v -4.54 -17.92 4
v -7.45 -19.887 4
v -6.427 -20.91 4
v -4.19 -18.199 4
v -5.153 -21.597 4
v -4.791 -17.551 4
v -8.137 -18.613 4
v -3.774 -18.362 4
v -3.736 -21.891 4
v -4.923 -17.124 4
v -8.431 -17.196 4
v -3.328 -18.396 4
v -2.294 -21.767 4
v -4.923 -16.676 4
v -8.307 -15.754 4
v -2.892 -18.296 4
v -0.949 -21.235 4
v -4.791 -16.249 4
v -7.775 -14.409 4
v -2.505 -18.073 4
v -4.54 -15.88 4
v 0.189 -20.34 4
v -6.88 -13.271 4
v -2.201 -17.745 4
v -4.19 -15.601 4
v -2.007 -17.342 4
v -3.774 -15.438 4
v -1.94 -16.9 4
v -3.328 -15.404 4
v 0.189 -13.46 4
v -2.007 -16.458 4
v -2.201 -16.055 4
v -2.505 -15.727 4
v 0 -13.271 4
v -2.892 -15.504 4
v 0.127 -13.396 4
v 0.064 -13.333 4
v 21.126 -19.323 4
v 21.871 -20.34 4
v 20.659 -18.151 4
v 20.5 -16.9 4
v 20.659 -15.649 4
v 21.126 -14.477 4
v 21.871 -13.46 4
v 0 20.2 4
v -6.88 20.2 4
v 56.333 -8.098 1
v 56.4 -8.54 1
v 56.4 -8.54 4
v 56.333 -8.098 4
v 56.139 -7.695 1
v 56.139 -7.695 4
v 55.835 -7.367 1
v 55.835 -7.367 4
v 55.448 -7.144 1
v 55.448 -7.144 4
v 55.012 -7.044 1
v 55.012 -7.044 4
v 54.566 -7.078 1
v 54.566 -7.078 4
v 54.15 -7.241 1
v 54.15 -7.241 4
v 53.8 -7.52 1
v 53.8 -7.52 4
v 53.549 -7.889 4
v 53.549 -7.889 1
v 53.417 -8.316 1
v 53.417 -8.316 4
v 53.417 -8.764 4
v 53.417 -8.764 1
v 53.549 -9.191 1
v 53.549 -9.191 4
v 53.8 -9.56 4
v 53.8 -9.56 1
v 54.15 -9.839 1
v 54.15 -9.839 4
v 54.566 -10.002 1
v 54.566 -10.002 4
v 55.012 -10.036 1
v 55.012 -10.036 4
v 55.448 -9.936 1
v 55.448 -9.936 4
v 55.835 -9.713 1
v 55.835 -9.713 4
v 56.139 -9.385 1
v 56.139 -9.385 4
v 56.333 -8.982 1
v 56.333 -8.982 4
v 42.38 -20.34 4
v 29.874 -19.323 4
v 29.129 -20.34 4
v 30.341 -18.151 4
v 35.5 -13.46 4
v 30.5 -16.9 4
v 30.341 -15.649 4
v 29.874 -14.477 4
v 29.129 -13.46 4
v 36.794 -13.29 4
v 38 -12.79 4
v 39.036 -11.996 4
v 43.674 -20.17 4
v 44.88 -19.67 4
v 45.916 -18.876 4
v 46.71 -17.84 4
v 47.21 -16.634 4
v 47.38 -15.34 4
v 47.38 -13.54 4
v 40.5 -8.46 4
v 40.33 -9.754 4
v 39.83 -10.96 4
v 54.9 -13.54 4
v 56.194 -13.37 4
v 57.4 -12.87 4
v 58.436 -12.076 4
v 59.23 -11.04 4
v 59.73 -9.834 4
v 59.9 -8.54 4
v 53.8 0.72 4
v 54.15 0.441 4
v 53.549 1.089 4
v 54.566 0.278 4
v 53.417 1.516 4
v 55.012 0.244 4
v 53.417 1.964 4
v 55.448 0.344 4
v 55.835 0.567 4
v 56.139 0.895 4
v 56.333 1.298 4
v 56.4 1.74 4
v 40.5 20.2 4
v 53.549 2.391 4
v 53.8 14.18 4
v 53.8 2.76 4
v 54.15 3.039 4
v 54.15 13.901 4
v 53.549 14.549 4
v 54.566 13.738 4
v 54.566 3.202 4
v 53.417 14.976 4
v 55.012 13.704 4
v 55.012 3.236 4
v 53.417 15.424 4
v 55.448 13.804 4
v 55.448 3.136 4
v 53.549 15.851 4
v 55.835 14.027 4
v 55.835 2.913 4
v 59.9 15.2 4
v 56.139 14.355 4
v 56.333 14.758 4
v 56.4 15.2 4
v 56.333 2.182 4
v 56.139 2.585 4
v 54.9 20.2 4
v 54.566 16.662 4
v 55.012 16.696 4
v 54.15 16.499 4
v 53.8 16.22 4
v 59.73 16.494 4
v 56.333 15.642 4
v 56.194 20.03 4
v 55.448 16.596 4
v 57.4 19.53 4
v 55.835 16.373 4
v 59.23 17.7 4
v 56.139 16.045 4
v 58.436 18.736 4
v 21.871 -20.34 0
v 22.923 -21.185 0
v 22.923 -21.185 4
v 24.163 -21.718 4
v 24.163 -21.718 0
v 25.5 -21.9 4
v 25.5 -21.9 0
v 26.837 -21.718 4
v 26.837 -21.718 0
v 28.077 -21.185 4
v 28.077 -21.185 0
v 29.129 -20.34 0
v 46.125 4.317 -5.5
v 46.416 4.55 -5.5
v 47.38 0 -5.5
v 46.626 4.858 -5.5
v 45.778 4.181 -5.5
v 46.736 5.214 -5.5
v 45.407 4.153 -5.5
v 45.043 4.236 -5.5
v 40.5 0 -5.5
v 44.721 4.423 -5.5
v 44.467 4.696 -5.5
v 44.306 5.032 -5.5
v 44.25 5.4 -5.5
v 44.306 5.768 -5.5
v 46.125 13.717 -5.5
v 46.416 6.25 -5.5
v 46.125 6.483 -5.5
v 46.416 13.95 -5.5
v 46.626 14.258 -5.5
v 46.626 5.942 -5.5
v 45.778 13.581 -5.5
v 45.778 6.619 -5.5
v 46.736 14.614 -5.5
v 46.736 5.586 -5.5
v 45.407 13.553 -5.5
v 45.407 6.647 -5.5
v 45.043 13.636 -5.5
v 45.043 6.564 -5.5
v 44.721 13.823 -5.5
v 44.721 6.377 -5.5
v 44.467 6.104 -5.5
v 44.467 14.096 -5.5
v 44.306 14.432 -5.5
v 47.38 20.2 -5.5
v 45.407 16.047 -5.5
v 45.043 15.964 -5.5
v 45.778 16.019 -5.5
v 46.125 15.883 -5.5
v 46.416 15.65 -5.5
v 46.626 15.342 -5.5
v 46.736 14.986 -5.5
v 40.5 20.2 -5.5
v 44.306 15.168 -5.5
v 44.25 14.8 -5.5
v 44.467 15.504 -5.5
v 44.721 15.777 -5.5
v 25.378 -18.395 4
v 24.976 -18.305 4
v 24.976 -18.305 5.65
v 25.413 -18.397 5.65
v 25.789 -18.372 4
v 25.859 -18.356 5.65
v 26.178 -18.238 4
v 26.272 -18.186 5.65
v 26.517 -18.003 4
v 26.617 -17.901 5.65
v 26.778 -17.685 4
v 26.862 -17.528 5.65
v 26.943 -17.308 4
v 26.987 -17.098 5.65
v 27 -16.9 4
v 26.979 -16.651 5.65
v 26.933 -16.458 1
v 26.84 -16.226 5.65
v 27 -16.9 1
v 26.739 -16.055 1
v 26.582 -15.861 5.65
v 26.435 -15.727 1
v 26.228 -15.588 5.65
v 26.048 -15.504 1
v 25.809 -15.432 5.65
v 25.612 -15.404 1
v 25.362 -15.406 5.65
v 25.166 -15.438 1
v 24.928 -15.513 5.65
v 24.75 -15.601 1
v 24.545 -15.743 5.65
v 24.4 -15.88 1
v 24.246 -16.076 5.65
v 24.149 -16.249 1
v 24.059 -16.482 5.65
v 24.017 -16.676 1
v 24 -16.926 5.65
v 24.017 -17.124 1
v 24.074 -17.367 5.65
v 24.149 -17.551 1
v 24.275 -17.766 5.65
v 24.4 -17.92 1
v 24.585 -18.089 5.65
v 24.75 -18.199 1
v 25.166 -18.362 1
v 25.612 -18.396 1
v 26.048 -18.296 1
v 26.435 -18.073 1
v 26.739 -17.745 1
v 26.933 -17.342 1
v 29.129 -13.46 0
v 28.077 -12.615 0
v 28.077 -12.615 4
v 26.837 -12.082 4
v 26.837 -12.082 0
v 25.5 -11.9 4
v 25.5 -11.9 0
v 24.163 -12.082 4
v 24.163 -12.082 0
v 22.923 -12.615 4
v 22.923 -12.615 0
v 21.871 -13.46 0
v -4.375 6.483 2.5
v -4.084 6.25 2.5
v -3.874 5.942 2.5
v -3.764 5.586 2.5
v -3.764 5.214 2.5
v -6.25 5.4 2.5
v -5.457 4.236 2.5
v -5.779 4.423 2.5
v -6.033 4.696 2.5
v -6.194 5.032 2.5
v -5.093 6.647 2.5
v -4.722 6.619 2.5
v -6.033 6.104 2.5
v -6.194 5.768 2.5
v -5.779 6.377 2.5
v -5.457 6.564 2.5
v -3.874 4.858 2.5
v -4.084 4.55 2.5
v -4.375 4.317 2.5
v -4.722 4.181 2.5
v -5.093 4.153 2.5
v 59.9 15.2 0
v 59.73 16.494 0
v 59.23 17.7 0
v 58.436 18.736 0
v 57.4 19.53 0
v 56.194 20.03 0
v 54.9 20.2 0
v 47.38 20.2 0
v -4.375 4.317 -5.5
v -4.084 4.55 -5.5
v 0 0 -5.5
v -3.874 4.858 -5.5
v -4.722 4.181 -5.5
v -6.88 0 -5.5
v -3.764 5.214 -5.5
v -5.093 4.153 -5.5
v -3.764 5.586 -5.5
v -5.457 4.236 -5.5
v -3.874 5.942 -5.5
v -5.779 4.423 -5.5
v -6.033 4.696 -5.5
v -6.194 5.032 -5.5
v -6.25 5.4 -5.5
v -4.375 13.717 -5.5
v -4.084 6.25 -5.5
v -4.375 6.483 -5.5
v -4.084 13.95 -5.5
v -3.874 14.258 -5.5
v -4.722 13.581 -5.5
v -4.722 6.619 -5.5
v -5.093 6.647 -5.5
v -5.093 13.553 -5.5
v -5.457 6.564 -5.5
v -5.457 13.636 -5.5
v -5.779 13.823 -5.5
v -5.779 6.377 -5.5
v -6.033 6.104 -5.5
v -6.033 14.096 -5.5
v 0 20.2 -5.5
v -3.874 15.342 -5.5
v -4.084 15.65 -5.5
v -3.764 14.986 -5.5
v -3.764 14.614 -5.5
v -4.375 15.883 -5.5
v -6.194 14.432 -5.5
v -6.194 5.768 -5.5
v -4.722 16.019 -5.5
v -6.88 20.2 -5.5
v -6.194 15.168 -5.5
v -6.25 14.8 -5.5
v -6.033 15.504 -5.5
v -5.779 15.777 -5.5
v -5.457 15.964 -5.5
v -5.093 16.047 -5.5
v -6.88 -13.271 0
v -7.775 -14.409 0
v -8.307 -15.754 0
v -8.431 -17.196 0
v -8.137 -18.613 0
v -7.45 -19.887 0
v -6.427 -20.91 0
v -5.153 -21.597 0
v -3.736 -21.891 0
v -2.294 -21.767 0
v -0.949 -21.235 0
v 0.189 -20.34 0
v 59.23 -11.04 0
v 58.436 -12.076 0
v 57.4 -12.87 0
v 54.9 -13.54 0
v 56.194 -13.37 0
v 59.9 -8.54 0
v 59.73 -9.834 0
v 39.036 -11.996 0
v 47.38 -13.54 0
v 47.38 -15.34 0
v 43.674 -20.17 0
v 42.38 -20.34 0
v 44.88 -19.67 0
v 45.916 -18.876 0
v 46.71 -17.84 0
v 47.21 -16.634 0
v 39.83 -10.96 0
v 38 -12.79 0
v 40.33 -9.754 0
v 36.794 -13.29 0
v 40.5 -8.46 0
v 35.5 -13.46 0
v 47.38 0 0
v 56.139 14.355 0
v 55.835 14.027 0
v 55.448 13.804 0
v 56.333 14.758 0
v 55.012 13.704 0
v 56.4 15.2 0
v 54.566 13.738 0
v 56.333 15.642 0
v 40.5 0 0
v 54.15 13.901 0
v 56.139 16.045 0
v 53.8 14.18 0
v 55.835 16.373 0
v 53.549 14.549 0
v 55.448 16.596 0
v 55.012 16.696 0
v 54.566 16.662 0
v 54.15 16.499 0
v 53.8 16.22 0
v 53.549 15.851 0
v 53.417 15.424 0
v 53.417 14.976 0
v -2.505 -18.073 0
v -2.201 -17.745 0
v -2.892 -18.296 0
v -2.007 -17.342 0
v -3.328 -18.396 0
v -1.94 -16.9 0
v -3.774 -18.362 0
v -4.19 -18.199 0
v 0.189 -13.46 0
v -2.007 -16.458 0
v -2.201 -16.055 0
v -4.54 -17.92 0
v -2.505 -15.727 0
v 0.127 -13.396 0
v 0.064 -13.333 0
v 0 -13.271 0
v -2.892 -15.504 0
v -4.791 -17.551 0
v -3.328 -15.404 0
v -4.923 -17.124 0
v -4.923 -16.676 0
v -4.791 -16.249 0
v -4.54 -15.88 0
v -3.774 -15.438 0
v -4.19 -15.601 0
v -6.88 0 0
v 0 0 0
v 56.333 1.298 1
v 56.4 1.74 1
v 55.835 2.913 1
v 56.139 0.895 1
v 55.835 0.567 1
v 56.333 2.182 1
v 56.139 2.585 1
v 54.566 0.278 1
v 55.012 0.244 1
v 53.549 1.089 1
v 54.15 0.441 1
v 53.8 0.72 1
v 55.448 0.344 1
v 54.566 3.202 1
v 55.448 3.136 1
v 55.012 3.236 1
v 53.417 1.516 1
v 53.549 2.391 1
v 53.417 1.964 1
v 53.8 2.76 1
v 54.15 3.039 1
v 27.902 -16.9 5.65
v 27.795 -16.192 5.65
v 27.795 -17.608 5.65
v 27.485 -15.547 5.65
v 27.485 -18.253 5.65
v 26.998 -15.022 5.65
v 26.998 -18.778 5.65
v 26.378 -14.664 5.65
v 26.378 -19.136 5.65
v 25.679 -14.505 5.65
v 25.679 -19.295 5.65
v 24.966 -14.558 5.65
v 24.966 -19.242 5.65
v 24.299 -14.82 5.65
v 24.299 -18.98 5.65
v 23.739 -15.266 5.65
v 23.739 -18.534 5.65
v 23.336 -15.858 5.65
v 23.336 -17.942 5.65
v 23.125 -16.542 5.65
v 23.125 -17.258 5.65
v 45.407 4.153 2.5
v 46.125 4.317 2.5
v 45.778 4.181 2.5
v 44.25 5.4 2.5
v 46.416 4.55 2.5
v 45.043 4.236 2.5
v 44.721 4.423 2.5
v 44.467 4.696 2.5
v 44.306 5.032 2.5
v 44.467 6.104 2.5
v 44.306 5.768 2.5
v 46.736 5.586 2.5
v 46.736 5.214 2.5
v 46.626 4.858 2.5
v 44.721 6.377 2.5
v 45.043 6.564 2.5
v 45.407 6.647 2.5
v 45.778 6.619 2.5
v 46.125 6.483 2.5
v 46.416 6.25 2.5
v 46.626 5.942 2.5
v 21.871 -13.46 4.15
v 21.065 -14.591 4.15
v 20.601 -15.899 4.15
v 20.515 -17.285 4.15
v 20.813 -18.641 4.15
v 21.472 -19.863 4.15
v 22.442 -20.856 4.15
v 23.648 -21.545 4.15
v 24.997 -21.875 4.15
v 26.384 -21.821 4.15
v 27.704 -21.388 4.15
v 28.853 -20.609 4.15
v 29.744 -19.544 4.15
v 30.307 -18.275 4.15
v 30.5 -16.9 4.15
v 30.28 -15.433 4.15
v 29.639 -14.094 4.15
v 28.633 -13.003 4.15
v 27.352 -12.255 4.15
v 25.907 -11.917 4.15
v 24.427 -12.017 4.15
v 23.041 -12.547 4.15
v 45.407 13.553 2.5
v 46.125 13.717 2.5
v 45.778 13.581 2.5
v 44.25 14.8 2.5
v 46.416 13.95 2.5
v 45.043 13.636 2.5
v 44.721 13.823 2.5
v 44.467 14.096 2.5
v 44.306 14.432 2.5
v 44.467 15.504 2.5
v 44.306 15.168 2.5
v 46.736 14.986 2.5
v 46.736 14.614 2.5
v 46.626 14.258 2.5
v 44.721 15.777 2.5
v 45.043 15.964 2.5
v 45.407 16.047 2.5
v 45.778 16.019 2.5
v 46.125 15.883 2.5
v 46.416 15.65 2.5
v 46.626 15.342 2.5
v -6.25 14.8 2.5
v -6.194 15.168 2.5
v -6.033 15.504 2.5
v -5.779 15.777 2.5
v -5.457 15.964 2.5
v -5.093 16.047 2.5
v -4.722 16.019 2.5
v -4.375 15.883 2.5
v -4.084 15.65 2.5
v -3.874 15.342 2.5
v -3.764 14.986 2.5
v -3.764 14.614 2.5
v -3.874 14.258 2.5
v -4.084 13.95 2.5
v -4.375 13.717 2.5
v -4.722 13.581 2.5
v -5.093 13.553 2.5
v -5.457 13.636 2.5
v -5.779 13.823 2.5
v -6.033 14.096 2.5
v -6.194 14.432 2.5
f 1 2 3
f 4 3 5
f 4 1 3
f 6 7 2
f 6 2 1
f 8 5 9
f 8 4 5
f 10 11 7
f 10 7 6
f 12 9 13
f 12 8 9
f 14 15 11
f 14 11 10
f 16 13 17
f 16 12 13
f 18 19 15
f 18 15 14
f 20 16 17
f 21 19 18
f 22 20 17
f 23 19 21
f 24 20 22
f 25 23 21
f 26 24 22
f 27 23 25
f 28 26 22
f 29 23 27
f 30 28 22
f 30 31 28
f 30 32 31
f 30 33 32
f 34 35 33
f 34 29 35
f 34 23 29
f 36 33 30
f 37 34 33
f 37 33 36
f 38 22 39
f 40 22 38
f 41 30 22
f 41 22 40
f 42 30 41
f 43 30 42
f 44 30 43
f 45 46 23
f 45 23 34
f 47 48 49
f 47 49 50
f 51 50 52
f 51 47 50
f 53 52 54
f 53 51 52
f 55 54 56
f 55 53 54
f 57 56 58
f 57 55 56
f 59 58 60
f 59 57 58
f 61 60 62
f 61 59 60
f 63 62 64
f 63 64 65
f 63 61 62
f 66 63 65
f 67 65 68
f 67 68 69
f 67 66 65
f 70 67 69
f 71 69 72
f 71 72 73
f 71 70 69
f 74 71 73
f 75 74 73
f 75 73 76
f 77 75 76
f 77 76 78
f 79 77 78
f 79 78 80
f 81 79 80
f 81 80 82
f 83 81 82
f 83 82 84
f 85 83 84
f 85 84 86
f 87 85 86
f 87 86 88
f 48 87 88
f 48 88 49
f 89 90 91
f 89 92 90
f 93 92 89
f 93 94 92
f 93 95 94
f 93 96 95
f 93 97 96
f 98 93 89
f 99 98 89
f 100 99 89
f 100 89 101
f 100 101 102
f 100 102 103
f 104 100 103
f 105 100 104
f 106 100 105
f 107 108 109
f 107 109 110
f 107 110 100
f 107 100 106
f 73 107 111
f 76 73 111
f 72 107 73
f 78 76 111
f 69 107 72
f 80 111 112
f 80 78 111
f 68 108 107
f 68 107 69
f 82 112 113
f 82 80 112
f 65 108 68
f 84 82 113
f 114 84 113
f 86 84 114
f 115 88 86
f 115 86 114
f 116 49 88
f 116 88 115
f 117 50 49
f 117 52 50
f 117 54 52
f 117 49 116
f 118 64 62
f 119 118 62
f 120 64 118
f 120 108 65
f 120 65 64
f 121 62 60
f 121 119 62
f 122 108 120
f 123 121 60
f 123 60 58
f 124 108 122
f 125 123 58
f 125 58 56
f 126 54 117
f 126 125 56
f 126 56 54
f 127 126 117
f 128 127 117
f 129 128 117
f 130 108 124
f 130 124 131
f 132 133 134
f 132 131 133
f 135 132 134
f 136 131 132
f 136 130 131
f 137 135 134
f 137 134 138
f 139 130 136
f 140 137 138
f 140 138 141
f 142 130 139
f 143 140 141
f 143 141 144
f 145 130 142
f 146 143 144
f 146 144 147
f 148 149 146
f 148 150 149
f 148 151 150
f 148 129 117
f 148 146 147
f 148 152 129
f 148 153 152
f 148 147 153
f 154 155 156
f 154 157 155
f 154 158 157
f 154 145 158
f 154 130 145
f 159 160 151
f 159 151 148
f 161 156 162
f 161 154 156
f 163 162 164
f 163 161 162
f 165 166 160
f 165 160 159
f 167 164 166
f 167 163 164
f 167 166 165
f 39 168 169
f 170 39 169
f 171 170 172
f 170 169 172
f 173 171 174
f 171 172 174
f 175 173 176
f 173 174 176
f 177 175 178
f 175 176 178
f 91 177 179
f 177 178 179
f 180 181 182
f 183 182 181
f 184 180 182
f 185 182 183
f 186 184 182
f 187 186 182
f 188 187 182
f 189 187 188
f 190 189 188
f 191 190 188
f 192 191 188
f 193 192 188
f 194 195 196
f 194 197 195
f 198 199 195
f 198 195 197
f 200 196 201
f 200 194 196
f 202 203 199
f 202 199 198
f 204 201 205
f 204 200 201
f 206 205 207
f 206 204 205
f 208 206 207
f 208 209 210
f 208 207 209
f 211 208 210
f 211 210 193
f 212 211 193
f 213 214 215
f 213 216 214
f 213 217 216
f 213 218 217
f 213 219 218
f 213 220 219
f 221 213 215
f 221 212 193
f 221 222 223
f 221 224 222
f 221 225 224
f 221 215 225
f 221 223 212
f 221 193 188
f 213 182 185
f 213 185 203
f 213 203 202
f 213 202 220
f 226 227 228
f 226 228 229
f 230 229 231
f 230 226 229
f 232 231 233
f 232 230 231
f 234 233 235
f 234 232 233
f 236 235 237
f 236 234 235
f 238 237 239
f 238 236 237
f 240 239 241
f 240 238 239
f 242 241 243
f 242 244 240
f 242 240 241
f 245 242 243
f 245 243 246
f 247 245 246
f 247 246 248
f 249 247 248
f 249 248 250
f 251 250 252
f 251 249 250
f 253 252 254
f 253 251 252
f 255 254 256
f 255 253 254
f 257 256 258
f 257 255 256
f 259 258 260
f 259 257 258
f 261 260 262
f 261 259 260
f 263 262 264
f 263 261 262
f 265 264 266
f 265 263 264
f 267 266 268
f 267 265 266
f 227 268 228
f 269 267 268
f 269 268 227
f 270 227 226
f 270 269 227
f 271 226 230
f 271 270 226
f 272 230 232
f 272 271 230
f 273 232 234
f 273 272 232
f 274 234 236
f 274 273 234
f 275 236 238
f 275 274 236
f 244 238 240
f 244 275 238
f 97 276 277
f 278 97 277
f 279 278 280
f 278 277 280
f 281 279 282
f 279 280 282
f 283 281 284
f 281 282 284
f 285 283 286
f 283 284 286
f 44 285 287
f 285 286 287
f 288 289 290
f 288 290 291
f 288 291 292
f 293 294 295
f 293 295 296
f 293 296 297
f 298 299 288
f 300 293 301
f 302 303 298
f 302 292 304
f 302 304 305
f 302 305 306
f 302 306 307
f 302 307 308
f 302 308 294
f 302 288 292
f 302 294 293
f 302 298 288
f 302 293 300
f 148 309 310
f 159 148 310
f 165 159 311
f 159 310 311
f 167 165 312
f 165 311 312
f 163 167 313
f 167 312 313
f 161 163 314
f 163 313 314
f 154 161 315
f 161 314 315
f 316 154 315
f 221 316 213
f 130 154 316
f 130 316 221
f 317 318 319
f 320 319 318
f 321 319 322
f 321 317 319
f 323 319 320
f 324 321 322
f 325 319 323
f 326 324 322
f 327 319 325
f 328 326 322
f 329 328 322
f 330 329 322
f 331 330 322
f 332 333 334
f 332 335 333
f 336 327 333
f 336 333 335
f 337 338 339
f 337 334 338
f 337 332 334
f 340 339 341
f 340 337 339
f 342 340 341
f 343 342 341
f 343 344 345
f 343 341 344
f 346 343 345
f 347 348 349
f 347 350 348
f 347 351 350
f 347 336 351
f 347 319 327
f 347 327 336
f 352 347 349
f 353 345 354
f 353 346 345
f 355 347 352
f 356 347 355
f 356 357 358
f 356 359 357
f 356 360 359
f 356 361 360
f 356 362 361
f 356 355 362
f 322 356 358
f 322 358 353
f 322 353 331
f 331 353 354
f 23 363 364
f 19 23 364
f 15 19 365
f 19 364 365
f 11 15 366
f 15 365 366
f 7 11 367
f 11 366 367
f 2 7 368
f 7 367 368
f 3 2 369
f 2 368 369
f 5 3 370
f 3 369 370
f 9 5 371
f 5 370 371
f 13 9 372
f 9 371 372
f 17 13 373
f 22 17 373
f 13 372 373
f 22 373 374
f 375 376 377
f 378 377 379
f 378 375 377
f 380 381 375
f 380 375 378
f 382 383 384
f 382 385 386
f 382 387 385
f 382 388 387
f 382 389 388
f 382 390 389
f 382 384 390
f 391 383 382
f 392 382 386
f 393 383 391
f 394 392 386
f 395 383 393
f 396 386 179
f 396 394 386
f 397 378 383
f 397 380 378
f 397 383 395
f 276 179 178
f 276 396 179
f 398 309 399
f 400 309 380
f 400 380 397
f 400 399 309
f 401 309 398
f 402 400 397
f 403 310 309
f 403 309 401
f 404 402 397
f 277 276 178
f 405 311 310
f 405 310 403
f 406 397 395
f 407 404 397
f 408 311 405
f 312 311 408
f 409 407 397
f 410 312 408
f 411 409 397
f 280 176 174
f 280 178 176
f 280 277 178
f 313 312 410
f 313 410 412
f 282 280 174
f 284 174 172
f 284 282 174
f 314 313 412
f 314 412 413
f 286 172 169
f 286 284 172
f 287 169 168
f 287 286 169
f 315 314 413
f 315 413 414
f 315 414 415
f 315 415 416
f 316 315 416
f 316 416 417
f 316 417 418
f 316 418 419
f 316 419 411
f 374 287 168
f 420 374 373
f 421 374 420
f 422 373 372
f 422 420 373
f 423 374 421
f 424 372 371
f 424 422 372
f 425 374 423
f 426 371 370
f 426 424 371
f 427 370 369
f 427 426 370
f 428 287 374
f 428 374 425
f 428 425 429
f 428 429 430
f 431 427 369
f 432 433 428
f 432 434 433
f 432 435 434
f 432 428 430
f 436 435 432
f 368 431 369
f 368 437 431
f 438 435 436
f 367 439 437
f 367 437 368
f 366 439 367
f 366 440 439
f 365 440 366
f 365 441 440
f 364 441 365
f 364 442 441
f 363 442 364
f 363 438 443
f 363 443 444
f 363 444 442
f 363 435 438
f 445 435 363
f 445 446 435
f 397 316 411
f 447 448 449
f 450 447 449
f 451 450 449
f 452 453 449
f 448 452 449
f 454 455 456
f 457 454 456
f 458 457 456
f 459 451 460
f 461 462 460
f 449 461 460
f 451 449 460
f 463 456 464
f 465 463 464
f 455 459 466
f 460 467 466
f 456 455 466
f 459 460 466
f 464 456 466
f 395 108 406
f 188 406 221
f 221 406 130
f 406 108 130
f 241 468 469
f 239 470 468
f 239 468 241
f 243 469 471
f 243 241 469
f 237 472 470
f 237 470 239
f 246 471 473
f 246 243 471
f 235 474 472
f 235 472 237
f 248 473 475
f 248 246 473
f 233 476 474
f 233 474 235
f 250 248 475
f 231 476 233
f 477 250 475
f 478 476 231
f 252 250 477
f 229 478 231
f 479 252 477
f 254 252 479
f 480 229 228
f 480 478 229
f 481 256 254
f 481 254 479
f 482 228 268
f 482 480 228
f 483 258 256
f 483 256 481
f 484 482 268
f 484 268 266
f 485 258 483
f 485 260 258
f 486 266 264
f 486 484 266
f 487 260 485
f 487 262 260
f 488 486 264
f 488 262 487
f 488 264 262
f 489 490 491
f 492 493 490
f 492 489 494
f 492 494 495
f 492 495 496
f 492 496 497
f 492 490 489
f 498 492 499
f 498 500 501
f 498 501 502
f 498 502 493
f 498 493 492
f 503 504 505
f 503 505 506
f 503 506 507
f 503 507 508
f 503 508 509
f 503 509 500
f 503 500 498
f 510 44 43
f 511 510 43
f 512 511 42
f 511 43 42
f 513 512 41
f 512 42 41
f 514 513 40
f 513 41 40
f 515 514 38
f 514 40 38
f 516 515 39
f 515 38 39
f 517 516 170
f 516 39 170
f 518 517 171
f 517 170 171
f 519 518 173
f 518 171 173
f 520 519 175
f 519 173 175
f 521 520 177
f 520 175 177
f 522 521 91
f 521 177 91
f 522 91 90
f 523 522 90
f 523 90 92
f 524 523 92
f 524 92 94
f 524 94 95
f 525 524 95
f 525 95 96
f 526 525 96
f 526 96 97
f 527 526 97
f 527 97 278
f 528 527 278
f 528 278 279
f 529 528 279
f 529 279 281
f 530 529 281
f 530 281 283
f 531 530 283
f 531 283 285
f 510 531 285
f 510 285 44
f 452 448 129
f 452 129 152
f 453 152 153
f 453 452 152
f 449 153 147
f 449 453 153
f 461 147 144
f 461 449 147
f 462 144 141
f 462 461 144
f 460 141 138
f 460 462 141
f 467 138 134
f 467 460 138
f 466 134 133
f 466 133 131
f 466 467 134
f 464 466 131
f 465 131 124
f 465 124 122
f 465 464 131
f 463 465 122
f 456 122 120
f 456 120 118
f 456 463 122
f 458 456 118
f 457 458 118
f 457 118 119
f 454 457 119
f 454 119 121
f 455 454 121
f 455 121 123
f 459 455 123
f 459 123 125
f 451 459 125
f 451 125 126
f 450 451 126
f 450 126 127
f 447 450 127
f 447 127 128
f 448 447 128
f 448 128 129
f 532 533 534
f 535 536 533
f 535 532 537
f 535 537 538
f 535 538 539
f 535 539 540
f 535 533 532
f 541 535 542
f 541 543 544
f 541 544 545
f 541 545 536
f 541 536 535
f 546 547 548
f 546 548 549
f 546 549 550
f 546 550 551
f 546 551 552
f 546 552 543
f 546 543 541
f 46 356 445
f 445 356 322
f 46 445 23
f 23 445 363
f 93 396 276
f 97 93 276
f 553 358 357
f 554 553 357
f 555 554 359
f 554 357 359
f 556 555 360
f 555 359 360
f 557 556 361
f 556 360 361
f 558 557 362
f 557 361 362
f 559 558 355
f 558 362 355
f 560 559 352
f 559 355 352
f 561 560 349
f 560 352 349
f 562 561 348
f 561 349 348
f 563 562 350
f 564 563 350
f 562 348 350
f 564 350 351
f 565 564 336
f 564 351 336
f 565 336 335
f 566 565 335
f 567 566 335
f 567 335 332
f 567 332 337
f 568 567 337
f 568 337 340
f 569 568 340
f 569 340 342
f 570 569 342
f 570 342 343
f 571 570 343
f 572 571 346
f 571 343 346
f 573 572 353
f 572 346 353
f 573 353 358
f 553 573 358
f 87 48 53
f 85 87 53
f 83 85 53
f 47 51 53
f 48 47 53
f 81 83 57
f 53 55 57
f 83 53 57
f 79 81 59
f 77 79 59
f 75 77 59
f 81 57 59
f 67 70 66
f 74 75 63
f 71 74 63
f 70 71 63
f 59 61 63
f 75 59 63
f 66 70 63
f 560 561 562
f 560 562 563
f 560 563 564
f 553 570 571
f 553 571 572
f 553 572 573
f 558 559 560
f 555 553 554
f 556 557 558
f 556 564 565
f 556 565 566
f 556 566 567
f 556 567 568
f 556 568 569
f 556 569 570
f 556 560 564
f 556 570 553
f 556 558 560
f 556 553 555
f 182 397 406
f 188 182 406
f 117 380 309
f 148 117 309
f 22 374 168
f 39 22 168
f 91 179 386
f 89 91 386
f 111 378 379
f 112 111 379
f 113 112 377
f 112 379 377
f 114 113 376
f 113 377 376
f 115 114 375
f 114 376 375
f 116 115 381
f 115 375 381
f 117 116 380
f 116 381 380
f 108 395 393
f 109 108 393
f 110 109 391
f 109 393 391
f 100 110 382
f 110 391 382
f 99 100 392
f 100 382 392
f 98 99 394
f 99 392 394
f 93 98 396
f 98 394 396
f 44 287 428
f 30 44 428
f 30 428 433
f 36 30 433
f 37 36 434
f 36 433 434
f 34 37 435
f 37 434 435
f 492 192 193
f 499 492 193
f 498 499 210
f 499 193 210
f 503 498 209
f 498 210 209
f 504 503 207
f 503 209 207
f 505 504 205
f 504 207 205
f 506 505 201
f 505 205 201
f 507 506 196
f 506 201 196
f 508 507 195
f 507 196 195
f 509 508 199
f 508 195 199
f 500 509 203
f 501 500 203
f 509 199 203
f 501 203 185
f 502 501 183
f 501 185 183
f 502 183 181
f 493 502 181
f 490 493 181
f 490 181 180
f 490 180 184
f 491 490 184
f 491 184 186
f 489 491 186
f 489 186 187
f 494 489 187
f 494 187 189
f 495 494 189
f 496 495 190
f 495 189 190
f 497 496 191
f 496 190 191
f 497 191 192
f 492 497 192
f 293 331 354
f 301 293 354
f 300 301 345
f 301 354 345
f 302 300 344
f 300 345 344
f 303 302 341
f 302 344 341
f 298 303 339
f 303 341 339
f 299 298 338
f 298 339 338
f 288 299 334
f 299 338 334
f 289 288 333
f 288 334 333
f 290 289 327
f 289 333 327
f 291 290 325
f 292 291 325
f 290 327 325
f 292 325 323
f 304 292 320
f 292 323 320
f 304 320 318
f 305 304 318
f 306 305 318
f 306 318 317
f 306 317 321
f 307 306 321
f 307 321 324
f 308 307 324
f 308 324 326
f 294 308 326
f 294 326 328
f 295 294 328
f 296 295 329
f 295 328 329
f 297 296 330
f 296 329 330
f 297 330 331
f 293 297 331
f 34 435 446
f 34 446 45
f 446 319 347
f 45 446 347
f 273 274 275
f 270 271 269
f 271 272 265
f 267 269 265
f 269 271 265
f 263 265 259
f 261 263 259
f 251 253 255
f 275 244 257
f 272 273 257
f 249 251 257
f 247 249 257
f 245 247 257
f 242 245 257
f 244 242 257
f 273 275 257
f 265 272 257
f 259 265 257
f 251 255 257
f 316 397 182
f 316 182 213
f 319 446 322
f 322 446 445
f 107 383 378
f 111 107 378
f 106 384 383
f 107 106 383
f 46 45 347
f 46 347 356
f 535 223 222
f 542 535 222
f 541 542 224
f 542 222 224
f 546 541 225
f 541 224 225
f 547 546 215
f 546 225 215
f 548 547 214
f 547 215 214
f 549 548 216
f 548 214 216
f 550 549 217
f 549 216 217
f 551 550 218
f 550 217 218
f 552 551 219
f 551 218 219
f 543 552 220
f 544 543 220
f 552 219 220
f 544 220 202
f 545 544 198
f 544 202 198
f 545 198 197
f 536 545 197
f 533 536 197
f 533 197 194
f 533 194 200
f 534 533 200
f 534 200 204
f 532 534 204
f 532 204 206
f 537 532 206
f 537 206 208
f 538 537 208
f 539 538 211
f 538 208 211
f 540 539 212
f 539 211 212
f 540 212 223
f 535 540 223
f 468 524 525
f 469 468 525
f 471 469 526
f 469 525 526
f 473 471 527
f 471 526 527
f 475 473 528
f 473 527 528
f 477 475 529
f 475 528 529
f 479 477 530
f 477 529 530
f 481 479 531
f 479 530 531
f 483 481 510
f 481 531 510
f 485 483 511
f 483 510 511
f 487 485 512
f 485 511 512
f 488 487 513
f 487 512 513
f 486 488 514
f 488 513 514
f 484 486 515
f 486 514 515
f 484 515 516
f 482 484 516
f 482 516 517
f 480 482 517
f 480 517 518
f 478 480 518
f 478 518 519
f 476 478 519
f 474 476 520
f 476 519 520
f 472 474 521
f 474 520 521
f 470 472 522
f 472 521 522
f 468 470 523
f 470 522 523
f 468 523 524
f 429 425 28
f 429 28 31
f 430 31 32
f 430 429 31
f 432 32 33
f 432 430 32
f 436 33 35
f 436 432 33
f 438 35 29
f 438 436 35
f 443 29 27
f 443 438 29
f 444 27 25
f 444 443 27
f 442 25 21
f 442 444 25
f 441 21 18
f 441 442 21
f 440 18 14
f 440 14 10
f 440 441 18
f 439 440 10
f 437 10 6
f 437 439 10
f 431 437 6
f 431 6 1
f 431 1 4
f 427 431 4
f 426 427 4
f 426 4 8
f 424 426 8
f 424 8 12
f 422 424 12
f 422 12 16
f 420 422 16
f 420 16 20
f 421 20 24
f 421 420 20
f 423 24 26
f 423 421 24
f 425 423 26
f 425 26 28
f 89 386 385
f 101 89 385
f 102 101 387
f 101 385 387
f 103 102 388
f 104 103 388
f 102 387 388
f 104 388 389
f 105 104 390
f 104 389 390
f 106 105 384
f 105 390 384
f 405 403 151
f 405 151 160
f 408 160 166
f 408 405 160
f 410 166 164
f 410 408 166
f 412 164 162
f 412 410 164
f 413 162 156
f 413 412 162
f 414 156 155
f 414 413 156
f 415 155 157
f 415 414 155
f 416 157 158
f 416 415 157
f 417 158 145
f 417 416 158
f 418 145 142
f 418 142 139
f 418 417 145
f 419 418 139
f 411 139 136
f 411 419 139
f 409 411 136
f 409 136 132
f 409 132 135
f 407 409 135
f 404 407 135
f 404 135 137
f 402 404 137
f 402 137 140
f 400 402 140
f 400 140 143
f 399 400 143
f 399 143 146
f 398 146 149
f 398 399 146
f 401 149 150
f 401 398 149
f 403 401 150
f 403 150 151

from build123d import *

# Parameters (mm, degrees)
CROQUIS1_R              = 1.5
SALIENTE_EXTRUIR1_DEPTH = 4
CROQUIS2_W              = 6.88
CROQUIS2_H              = 20.2
SALIENTE_EXTRUIR2_DEPTH = 5.5
CROQUIS3_R              = 5
CROQUIS3_R_2            = 1.5
SALIENTE_EXTRUIR3_DEPTH = 1.65
CROQUIS4_R              = 1.5
SALIENTE_EXTRUIR4_DEPTH = 1
CROQUIS5_R              = 1.25
CORTAR_EXTRUIR1_DEPTH   = 8


with BuildPart() as part:
    # Croquis1 → Saliente-Extruir1 (new body)
    with BuildSketch(Plane.XY):
        with BuildLine():
            Line((59.9, -8.54), (59.9, 15.2))
            ThreePointArc((59.9, 15.2), (58.435533906, 18.735533906), (54.9, 20.2))
            Line((54.9, 20.2), (40.5, 20.2))
            Line((40.5, 20.2), (40.5, -8.46))
            ThreePointArc((40.5, -8.46), (39.035533906, -11.995533906), (35.5, -13.46))
            Line((35.5, -13.46), (29.128553431, -13.46))
            ThreePointArc((29.128553431, -13.46), (25.5, -11.9), (21.871446569, -13.46))
            Line((21.871446569, -13.46), (0.188553431, -13.46))
            ThreePointArc((0.188553431, -13.46), (0.095533906, -13.364466094), (0, -13.271446569))
            Line((0, -13.271446569), (0, 20.2))
            Line((0, 20.2), (-6.88, 20.2))
            Line((-6.88, 20.2), (-6.88, -13.271446569))
            ThreePointArc((-6.88, -13.271446569), (-6.975533906, -20.435533906), (0.188553431, -20.34))
            Line((0.188553431, -20.34), (21.871446569, -20.34))
            ThreePointArc((21.871446569, -20.34), (25.5, -21.9), (29.128553431, -20.34))
            Line((29.128553431, -20.34), (42.38, -20.34))
            ThreePointArc((42.38, -20.34), (45.915533906, -18.875533906), (47.38, -15.34))
            Line((47.38, -15.34), (47.38, -13.54))
            Line((47.38, -13.54), (54.9, -13.54))
            ThreePointArc((54.9, -13.54), (58.435533906, -12.075533906), (59.9, -8.54))
        make_face()
        with Locations((54.9, 1.74)):
            Circle(CROQUIS1_R, mode=Mode.SUBTRACT)
        with Locations((54.9, -8.54)):
            Circle(CROQUIS1_R, mode=Mode.SUBTRACT)
        with Locations((25.5, -16.9)):
            Circle(CROQUIS1_R, mode=Mode.SUBTRACT)
        with Locations((-3.44, -16.9)):
            Circle(CROQUIS1_R, mode=Mode.SUBTRACT)
        with Locations((54.9, 15.2)):
            Circle(CROQUIS1_R, mode=Mode.SUBTRACT)
    extrude(amount=SALIENTE_EXTRUIR1_DEPTH)

    # Croquis2 → Saliente-Extruir2 (add)
    with BuildSketch(Plane(origin=(0, 0, 0), x_dir=(-1, 0, 0), z_dir=(0, 0, -1))):
        with Locations((-43.94, 10.1)):
            Rectangle(CROQUIS2_W, CROQUIS2_H)
        with Locations((3.44, 10.1)):
            Rectangle(CROQUIS2_W, CROQUIS2_H)
    extrude(amount=SALIENTE_EXTRUIR2_DEPTH)

    # Croquis3 → Saliente-Extruir3 (add)
    with BuildSketch(Plane.XY.offset(4)):
        with Locations(Location((25.5, -16.9, 0), (0, 0, 136.528000689))):
            Circle(CROQUIS3_R)
        with Locations(Location((25.5, -16.9, 0), (0, 0, 249.548360479))):
            Circle(CROQUIS3_R_2, mode=Mode.SUBTRACT)
    extrude(amount=SALIENTE_EXTRUIR3_DEPTH)

    # Croquis4 → Saliente-Extruir4 (add)
    with BuildSketch(Plane(origin=(0, 0, 0), x_dir=(-1, 0, 0), z_dir=(0, 0, -1))):
        with Locations((-25.5, -16.9)):
            Circle(CROQUIS4_R)
        with Locations((-54.9, 1.74)):
            Circle(CROQUIS4_R)
        with Locations((-54.9, -8.54)):
            Circle(CROQUIS4_R)
    extrude(amount=-SALIENTE_EXTRUIR4_DEPTH)

    # Croquis5 → Cortar-Extruir1 (cut)
    with BuildSketch(Plane(origin=(0, 0, -5.5), x_dir=(-1, 0, 0), z_dir=(0, 0, -1))):
        with Locations((-45.5, 5.4)):
            Circle(CROQUIS5_R)
        with Locations((-45.5, 14.8)):
            Circle(CROQUIS5_R)
        with Locations((5, 14.8)):
            Circle(CROQUIS5_R)
        with Locations((5, 5.4)):
            Circle(CROQUIS5_R)
    extrude(amount=-CORTAR_EXTRUIR1_DEPTH, mode=Mode.SUBTRACT)

    # Chaflán1: read off the stored shape, not the designer's step
    # Chaflán1 outline → Chaflán1 (revolve, cut)
    with BuildSketch(Plane(origin=(25.5, -16.9, 0), x_dir=(1, 0, 0), z_dir=(0, -1, 0))):
        Polygon((5, 5.65), (2.401923789, 5.65), (5, 4.15), align=None)
    revolve(axis=Axis((25.5, -16.9, 0), (0, 0, 1)), mode=Mode.SUBTRACT)


solid = part.part
